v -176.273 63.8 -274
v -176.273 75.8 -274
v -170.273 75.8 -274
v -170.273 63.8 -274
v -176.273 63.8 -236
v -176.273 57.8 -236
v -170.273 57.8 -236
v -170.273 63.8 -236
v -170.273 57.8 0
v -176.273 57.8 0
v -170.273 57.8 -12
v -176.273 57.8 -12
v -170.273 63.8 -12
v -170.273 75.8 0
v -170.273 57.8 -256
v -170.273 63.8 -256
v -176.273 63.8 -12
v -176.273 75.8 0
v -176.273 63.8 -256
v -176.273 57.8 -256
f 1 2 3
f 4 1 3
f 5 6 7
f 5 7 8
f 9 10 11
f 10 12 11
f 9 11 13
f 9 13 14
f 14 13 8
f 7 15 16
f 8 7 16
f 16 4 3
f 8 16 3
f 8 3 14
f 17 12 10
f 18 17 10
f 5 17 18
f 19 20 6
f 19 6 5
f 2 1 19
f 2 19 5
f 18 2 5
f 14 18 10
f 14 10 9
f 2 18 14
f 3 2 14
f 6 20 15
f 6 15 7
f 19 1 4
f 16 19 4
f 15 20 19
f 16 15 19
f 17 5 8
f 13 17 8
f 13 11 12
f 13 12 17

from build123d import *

# Parameters (mm, degrees)
EXTRUDE_START            = -274
SKETCH_1_W               = 6
SKETCH_1_H               = 12
EXTRUDE_1_DEPTH          = 268
CUT_EXTRUDE_2_DEPTH      = 335.505178406
CUT_EXTRUDE_2_DEPTH_BACK = 335.505178406
SKETCH_3106_W            = 6
SKETCH_3106_H            = 6.1
EXTRUDE_3215_DEPTH       = 6
OTHER_START              = 57.8
OTHER_3265_OUTLINE_W     = 6
OTHER_3265_OUTLINE_H     = 6
OTHER_3265_DEPTH         = 5.8
SKETCH_3419_W            = 24
SKETCH_3419_H            = 12
EXTRUDE_3519_DEPTH       = 6
OTHER_START_2            = -176.272727273
OTHER_3590_OUTLINE_W     = 6
OTHER_3590_OUTLINE_H     = 20
OTHER_3590_DEPTH         = 6
SKETCH_2_W               = 6
SKETCH_2_H               = 12.2
EXTRUDE_2_DEPTH          = 6


# Read off the part's stored shape, not the designer's step: the other step, the other step
with BuildPart() as part:
    # Sketch 1 → Extrude 1 (new body)
    with BuildSketch(Plane.XY.offset(EXTRUDE_START)):
        with Locations((-173.272727273, 69.8)):
            Rectangle(SKETCH_1_W, SKETCH_1_H)
    extrude(amount=EXTRUDE_1_DEPTH)

    # Sketch 3011 → Cut-Extrude 2 (cut, two sides: drawn at the far end of the back side and taken through both)
    with BuildSketch(Plane(origin=(0, 0, 0), x_dir=(0, 0, -1), z_dir=(1, 0, 0)).offset(-CUT_EXTRUDE_2_DEPTH_BACK)):
        Polygon((140.075, 62.8), (139.925, 62.8), (139.925, 66.725), (127.925, 66.725), (127.925, 72.875), (139.925, 72.875), (139.925, 76.8), (140.075, 76.8), (140.075, 72.725), (128.075, 72.725), (128.075, 66.875), (140.075, 66.875), align=None)
    extrude(amount=CUT_EXTRUDE_2_DEPTH + CUT_EXTRUDE_2_DEPTH_BACK, mode=Mode.SUBTRACT)


with BuildPart() as cut_extrude_2_piece_1:
    # of the separate pieces the step leaves, piece 1, a body of its own (cut_extrude_2_pieces)
    add(part.part.solids().sort_by_distance((-176.272727273, 75.8, -274))[0])



with BuildPart() as cut_extrude_2_piece_2:
    # of the separate pieces the step leaves, piece 2, a body of its own (cut_extrude_2_pieces)
    add(part.part.solids().sort_by_distance((-176.272727273, 75.8, -139.925))[0])

    # Sketch 3106 → Extrude 3215 (add)
    with BuildSketch(Plane.ZY.offset(176.272727273)):
        with Locations((-9, 60.85)):
            Rectangle(SKETCH_3106_W, SKETCH_3106_H)
    extrude(amount=-EXTRUDE_3215_DEPTH)

    # Other 3265 outline → Other 3265 (add)
    with BuildSketch(Plane(origin=(0, 0, 0), x_dir=(1, 0, 0), z_dir=(0, 1, 0)).offset(OTHER_START)):
        with Locations((-173.272727273, 3)):
            Rectangle(OTHER_3265_OUTLINE_W, OTHER_3265_OUTLINE_H)
    extrude(amount=OTHER_3265_DEPTH)


with BuildPart() as cut_extrude_2_piece_1_1:
    add(cut_extrude_2_piece_1.part)

    add(cut_extrude_2_piece_2.part)  # Extrude 3519 merges Cut-Extrude 2 piece 2
    # Sketch 3419 → Extrude 3519 (add)
    with BuildSketch(Plane.ZY.offset(176.272727273)):
        with Locations((-134, 69.8)):
            Rectangle(SKETCH_3419_W, SKETCH_3419_H)
    extrude(amount=-EXTRUDE_3519_DEPTH)

    # Other 3590 outline → Other 3590 (add)
    with BuildSketch(Plane.YZ.offset(OTHER_START_2)):
        with Locations((60.8, -246)):
            Rectangle(OTHER_3590_OUTLINE_W, OTHER_3590_OUTLINE_H)
    extrude(amount=OTHER_3590_DEPTH)

    # Sketch 2 → Extrude 2 (add)
    with BuildSketch(Plane.XY.offset(-6)):
        with Locations((-173.272727273, 69.7)):
            Rectangle(SKETCH_2_W, SKETCH_2_H)
    extrude(amount=EXTRUDE_2_DEPTH)


solid = cut_extrude_2_piece_1_1.part
